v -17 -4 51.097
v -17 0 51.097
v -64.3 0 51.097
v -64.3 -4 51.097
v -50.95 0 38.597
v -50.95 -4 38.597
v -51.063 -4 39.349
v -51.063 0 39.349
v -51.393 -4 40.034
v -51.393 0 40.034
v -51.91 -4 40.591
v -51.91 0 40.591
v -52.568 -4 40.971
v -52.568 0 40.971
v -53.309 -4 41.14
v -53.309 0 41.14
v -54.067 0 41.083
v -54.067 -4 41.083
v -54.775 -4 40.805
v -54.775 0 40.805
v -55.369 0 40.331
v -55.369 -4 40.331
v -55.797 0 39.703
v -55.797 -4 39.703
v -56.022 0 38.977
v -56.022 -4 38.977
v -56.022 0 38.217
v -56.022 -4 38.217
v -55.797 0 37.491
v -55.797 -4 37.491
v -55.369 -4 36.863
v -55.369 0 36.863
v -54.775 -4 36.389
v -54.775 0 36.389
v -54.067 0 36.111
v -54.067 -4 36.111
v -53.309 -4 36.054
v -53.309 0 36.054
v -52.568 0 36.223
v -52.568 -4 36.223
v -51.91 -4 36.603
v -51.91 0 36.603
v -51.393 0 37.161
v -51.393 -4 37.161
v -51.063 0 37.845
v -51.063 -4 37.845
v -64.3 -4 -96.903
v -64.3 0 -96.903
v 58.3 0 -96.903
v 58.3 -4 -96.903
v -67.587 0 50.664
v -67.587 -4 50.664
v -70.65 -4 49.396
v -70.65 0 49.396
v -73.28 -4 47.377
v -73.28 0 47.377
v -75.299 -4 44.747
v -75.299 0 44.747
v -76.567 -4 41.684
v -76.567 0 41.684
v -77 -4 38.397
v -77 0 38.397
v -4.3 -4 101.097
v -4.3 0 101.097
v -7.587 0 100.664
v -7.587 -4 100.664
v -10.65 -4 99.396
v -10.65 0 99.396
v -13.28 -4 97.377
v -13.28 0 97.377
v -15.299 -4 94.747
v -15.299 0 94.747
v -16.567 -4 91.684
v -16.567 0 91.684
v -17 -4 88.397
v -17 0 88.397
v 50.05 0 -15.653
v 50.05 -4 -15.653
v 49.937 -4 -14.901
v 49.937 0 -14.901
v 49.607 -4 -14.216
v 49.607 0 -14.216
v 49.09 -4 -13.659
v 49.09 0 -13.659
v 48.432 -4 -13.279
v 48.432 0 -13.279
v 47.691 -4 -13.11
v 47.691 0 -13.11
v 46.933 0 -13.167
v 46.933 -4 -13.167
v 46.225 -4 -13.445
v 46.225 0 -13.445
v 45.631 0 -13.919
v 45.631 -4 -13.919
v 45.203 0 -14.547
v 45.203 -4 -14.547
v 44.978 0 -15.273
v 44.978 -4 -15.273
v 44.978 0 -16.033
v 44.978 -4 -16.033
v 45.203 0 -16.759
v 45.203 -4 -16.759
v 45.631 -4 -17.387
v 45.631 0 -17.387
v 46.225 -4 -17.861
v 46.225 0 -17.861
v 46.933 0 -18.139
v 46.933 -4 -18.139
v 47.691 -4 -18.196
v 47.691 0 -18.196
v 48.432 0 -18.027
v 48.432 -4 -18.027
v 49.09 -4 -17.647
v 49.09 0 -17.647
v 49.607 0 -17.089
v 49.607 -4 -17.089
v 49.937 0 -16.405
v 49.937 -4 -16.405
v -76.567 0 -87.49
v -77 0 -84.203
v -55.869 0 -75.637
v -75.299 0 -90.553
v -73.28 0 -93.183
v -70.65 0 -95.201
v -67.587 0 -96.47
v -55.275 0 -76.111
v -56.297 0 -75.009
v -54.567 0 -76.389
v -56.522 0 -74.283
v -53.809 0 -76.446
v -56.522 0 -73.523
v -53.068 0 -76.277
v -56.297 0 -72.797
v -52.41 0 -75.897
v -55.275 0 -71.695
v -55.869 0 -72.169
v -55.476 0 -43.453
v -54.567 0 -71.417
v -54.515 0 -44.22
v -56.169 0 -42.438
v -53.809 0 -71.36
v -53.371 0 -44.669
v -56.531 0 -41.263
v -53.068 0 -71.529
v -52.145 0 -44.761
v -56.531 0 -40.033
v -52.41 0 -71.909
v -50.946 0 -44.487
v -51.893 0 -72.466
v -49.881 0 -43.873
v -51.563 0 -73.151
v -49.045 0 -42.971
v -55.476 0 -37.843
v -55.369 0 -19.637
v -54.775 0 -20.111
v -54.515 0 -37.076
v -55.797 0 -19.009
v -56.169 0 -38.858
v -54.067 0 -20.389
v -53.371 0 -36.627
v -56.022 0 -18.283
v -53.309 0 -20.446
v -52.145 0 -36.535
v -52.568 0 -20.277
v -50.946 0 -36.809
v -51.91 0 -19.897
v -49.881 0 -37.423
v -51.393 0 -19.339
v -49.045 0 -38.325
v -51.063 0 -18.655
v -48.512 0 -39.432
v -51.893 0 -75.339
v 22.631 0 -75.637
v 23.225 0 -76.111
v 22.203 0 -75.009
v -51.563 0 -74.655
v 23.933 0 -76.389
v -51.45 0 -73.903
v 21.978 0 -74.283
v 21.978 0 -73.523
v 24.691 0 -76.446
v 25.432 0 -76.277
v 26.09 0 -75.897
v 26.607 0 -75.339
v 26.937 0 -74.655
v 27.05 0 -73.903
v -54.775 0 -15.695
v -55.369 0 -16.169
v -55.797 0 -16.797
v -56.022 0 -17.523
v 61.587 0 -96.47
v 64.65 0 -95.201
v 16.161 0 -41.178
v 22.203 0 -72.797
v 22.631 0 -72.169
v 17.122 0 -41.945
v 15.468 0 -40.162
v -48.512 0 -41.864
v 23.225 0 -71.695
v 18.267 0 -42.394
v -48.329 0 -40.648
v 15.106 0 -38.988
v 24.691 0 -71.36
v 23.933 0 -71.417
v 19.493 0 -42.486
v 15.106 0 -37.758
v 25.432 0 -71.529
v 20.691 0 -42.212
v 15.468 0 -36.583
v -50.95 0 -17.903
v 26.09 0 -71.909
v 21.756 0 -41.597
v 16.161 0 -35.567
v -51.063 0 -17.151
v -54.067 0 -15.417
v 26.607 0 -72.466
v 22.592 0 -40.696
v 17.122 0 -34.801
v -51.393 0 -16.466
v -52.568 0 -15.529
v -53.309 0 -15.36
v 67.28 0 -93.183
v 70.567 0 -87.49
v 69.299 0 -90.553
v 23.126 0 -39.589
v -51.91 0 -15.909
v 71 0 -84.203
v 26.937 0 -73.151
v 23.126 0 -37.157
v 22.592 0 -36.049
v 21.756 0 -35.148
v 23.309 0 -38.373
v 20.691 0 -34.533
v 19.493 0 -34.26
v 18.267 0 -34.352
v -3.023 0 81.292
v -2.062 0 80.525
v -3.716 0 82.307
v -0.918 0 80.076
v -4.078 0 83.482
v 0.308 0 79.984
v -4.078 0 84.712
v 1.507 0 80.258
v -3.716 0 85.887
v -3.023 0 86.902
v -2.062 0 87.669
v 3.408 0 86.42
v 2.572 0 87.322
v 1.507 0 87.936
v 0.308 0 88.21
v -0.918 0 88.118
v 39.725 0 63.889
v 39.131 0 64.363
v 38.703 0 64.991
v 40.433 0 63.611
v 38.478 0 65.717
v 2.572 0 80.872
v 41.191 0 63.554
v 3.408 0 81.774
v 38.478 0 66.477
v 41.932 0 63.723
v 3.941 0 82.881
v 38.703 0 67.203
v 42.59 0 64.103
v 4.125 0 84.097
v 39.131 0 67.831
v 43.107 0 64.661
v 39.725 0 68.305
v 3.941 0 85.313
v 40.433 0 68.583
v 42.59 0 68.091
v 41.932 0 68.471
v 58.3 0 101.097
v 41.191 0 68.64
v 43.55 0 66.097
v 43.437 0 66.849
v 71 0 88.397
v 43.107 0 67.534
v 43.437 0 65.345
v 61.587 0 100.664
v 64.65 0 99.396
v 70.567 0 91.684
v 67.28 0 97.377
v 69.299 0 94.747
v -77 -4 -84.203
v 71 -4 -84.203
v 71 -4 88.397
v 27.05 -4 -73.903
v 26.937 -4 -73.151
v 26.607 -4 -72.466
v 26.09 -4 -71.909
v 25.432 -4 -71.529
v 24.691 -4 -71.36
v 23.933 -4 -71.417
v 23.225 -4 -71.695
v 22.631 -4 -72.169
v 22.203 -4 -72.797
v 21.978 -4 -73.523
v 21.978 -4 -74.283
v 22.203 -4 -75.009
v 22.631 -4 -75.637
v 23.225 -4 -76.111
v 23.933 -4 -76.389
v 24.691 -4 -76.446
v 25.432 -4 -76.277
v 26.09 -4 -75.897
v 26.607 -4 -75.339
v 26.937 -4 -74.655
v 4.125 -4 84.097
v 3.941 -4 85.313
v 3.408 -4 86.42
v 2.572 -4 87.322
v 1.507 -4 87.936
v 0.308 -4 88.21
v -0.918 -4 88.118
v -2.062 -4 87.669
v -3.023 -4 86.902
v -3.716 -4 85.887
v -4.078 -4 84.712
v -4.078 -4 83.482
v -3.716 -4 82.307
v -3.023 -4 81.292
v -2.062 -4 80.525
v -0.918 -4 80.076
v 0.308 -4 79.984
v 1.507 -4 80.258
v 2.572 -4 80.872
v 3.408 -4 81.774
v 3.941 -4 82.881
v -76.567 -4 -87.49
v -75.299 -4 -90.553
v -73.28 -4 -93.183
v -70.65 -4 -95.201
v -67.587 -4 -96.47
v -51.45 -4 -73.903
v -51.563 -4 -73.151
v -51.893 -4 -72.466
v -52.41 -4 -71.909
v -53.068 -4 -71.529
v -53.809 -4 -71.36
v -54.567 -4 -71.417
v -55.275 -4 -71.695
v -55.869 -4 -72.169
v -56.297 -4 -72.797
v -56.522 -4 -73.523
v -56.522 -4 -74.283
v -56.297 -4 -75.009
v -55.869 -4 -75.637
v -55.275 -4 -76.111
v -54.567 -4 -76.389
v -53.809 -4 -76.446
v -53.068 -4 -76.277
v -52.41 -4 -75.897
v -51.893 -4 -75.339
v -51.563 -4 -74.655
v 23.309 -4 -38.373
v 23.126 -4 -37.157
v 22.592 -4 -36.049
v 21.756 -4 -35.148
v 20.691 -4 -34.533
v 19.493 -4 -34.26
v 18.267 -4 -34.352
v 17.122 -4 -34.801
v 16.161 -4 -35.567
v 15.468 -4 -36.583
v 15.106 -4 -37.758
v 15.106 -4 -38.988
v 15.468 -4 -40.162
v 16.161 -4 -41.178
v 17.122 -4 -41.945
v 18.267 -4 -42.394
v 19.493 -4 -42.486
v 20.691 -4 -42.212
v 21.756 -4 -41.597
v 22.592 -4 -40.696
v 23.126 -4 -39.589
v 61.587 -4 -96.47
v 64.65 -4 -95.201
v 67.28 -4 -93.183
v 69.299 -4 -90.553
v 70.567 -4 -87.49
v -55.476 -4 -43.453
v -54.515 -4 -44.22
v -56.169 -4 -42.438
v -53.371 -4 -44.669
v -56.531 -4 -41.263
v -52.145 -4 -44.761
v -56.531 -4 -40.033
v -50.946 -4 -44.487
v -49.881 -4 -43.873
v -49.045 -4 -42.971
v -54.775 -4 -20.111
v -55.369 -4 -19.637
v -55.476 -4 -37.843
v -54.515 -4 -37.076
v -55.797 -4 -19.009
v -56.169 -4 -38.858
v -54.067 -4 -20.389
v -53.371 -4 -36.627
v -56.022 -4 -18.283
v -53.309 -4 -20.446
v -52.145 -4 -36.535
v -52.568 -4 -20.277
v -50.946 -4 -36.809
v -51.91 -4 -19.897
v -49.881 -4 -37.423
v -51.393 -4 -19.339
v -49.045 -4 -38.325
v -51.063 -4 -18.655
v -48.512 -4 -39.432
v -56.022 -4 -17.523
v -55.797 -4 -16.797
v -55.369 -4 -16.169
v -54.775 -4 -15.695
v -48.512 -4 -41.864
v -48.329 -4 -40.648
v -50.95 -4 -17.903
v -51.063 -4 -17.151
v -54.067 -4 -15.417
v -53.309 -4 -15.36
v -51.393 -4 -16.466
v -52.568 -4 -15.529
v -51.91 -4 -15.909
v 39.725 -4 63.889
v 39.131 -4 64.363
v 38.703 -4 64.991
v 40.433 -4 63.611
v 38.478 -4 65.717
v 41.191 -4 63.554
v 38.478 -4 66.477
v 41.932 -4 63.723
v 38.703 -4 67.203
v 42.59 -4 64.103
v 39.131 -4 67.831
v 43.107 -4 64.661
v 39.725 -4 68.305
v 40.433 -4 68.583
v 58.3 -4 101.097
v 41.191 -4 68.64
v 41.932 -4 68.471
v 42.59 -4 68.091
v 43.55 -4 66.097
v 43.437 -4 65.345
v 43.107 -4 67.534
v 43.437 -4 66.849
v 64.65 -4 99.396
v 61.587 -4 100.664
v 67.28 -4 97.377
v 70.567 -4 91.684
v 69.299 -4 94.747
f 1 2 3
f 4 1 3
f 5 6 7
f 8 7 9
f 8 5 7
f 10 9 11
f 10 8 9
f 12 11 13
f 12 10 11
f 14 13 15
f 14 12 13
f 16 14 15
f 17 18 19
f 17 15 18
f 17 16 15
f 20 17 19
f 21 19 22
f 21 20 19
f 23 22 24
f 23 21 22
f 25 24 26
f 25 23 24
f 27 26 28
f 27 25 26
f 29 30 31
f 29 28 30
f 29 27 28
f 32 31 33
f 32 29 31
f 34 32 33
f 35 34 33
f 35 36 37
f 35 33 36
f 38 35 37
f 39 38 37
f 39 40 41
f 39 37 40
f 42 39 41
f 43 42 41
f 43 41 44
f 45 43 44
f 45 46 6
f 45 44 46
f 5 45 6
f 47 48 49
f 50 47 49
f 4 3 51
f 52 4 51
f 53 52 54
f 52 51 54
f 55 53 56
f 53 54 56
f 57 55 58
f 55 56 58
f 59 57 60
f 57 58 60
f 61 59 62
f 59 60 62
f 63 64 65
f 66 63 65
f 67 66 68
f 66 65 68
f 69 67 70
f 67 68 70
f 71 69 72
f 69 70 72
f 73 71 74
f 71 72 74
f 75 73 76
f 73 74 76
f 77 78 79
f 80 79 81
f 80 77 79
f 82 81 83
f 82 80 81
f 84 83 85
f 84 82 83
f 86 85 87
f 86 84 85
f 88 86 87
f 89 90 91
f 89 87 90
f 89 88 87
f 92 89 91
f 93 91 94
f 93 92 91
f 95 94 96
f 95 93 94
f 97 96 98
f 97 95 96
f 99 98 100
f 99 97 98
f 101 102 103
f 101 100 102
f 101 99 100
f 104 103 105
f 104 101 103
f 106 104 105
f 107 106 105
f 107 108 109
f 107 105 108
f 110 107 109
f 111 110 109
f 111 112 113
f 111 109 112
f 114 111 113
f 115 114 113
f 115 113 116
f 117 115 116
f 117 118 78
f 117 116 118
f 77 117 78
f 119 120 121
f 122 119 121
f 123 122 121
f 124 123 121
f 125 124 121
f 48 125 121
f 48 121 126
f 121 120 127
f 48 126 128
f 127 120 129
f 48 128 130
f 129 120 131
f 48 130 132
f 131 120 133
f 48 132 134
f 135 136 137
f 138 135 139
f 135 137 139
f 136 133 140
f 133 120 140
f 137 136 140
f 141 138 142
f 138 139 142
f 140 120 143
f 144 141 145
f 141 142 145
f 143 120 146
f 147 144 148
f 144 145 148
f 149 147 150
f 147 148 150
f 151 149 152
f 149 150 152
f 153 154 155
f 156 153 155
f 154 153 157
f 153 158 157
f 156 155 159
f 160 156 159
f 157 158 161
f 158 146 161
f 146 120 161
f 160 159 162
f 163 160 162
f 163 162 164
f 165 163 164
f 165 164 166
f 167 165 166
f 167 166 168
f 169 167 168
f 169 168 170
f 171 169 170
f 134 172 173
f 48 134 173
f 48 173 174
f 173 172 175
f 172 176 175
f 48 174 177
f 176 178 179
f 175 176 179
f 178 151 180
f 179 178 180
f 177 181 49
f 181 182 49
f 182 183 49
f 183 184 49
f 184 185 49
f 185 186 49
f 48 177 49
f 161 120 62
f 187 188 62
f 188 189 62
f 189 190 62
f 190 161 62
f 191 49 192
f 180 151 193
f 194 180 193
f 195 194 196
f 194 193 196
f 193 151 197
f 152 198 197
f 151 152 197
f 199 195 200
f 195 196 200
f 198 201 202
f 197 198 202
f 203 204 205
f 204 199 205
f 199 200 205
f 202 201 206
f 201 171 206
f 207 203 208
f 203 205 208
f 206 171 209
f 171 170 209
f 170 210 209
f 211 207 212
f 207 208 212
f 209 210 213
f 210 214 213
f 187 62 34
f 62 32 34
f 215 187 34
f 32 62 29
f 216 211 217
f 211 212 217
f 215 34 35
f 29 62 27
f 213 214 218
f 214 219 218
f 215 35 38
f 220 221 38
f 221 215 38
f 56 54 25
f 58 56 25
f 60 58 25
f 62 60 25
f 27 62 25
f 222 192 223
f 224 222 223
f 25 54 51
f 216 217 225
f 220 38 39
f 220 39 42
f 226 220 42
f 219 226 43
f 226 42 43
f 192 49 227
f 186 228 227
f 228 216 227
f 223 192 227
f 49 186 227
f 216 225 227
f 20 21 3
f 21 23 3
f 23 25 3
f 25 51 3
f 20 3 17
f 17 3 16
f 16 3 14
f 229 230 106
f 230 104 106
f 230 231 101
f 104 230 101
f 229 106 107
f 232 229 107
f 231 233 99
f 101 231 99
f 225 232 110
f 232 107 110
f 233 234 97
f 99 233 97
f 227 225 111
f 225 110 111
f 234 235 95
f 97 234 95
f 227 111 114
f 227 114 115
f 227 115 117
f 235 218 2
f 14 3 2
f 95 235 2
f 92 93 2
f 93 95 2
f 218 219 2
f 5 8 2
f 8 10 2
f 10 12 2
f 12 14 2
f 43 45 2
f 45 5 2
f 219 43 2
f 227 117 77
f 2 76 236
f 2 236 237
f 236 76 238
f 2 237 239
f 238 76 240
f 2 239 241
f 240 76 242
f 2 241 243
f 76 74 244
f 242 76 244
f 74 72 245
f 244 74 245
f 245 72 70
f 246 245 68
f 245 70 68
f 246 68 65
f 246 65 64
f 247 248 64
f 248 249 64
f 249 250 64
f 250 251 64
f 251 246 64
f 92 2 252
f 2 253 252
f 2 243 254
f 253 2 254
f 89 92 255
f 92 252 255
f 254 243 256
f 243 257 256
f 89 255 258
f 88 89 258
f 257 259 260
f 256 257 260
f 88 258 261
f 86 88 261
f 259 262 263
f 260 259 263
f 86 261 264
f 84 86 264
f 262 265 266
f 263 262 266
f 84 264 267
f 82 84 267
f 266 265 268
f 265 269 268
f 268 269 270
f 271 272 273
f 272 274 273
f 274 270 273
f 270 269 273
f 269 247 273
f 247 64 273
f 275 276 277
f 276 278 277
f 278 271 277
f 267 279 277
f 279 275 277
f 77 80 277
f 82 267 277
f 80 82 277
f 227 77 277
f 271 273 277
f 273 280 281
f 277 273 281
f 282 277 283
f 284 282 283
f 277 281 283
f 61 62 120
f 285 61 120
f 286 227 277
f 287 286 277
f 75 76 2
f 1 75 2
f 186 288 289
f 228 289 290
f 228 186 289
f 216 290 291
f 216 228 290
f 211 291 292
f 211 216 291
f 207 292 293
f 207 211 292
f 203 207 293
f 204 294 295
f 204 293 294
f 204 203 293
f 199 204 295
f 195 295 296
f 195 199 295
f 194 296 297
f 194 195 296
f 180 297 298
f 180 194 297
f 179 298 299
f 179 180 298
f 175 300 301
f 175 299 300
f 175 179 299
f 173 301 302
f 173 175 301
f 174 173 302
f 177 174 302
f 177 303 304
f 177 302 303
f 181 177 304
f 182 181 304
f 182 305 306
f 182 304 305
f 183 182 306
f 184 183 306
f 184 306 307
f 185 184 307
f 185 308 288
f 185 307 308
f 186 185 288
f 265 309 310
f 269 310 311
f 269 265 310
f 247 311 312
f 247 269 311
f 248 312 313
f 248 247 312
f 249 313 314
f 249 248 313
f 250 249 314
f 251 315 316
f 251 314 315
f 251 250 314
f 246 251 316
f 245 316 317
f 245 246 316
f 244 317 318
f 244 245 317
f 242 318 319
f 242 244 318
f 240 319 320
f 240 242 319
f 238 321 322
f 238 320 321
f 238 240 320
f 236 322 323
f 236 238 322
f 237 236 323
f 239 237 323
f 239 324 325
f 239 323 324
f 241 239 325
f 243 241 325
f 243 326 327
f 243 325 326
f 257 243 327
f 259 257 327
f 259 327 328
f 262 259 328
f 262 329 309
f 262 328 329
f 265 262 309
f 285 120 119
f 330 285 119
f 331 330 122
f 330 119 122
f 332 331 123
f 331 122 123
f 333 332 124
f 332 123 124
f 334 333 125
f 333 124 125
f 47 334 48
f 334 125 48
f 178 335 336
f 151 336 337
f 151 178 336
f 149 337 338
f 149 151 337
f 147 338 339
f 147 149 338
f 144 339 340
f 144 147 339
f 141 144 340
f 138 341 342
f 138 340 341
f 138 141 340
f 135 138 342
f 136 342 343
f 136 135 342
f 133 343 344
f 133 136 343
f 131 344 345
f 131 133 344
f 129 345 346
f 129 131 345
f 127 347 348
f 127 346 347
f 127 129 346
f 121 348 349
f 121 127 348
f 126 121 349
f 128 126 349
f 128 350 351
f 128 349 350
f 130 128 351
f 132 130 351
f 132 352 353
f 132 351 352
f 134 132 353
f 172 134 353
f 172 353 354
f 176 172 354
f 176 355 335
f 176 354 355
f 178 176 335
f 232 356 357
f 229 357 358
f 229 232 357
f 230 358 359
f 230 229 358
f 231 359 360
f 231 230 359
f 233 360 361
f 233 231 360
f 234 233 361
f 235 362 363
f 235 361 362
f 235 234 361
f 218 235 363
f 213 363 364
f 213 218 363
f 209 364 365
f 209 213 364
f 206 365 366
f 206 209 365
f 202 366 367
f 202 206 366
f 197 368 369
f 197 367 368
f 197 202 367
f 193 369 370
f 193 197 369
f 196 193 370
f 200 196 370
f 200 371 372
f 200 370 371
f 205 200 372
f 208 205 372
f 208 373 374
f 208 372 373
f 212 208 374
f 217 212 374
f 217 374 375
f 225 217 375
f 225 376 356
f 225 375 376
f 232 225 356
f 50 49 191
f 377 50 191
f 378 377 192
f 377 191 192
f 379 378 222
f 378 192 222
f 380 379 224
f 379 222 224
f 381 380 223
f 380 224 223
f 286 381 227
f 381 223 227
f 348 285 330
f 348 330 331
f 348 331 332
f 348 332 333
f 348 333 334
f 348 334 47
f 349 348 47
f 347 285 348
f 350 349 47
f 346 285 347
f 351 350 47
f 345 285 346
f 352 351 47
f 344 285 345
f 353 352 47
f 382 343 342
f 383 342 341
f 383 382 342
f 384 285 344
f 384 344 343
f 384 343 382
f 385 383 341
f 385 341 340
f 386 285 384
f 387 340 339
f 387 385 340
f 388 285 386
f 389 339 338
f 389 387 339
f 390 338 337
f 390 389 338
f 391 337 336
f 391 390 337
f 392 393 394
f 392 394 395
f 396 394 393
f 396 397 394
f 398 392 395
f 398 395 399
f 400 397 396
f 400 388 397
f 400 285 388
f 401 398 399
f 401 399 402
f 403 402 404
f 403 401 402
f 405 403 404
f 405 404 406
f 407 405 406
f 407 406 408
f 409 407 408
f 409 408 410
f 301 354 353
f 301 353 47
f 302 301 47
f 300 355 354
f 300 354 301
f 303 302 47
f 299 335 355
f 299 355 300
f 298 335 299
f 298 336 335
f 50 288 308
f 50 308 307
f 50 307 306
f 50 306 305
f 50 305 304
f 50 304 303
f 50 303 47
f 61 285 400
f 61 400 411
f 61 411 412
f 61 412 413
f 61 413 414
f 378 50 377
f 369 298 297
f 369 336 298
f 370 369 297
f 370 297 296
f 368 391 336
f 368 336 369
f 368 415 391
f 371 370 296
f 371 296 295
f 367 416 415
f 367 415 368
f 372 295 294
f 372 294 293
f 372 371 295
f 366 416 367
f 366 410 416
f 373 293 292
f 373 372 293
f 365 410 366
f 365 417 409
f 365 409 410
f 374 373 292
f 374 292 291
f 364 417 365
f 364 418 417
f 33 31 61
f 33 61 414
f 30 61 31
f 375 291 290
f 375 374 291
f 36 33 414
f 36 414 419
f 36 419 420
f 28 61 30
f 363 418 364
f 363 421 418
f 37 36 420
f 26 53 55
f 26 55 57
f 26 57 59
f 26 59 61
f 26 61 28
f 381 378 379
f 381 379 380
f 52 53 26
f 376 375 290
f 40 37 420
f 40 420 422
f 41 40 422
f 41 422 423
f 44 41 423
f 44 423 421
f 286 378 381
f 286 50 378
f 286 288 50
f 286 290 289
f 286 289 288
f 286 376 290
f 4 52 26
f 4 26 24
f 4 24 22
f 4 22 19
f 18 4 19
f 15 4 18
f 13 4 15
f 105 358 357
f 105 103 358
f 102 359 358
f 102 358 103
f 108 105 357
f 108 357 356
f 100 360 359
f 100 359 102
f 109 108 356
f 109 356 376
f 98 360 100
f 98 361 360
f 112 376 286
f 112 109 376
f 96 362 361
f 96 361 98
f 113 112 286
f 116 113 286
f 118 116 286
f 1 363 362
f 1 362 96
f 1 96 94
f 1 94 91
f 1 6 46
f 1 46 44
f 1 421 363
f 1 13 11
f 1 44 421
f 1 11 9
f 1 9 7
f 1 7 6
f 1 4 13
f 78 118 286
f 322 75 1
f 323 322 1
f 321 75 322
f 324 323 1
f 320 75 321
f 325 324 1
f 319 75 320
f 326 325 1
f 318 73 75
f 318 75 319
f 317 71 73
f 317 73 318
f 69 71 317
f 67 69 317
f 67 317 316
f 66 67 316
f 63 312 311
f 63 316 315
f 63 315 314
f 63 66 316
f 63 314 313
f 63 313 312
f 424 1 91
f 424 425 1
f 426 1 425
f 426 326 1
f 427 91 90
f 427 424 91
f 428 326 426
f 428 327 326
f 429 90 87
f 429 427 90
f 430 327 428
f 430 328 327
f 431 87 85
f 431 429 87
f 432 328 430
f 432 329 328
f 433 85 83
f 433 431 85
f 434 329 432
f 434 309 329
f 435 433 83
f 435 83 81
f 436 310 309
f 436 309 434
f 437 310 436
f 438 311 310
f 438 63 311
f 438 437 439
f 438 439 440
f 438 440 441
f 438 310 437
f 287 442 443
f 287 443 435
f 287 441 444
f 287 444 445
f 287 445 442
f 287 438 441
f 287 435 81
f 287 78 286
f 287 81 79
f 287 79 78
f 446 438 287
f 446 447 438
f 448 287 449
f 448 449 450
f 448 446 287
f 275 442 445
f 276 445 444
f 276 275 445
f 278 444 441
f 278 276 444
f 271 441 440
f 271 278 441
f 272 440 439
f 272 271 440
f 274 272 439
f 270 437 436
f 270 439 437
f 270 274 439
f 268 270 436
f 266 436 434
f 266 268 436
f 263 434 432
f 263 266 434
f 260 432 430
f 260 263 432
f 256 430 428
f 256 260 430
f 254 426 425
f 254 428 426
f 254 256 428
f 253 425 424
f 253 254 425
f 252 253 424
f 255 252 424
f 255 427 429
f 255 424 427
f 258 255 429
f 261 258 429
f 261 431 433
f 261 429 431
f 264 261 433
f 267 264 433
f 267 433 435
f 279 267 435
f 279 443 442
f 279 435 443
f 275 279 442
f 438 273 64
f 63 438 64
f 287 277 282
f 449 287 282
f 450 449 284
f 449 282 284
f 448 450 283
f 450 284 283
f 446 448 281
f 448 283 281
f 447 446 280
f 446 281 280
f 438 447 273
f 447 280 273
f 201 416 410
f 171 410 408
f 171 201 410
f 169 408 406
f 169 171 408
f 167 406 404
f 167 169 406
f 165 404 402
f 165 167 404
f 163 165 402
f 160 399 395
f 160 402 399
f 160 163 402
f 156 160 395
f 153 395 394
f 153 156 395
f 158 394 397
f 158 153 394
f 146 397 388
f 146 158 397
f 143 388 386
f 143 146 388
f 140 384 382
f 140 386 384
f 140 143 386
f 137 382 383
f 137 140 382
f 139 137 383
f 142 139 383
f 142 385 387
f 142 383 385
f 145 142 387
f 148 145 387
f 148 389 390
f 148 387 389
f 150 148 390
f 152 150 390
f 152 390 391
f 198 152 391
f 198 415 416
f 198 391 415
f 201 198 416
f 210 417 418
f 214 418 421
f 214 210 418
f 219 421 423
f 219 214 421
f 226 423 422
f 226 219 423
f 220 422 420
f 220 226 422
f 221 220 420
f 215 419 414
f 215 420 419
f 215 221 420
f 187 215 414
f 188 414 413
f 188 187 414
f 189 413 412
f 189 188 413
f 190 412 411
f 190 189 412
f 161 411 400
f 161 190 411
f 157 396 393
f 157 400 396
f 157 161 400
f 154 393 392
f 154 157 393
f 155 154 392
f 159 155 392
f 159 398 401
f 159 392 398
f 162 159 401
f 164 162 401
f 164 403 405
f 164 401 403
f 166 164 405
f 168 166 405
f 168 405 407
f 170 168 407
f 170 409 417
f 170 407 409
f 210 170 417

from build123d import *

# Parameters (mm, degrees)
F5_DEPTH = 4
F0_R     = 4.124509
F6_DEPTH = 32.004
F4_R     = 2.55
F7_DEPTH = 18.542
F2_R     = 2.55
F8_DEPTH = 16.764
F3_R     = 2.55
F9_DEPTH = 10.668


with BuildPart() as f5:
    # F1 (on Front) → F5 (new body)
    with BuildSketch(Plane.XZ):
        with BuildLine():
            ThreePointArc((-4.3, 101.097035), (-13.280256, 97.377291), (-17, 88.397035))
            Line((-17, 88.397035), (-17, 51.097035))
            Line((-17, 51.097035), (-64.3, 51.097035))
            ThreePointArc((-64.3, 51.097035), (-73.280256, 47.377291), (-77, 38.397035))
            Line((-77, 38.397035), (-77, -84.202965))
            ThreePointArc((-77, -84.202965), (-73.280256, -93.183221), (-64.3, -96.902965))
            Line((-64.3, -96.902965), (58.3, -96.902965))
            ThreePointArc((58.3, -96.902965), (67.280256, -93.183221), (71, -84.202965))
            Line((71, -84.202965), (71, 88.397035))
            ThreePointArc((71, 88.397035), (67.280256, 97.377291), (58.3, 101.097035))
            Line((58.3, 101.097035), (-4.3, 101.097035))
        make_face()
    extrude(amount=F5_DEPTH)

    # F0 (on Front) → F6 (cut)
    with BuildSketch(Plane.XZ):
        with Locations((-52.453019, -40.648032)):
            Circle(F0_R)
        with Locations((19.184319, -38.372811)):
            Circle(F0_R)
        with Locations((0, 84.097035)):
            Circle(F0_R)
    extrude(amount=F6_DEPTH, mode=Mode.SUBTRACT)

    # F4 (on Front) → F7 (cut)
    with BuildSketch(Plane.XZ):
        with Locations((-54, -73.902965)):
            Circle(F4_R)
        with Locations((24.5, -73.902965)):
            Circle(F4_R)
    extrude(amount=F7_DEPTH, mode=Mode.SUBTRACT)

    # F2 (on Front) → F8 (cut)
    with BuildSketch(Plane.XZ):
        with Locations((-53.5, 38.597035)):
            Circle(F2_R)
        with Locations((-53.5, -17.902965)):
            Circle(F2_R)
    extrude(amount=F8_DEPTH, mode=Mode.SUBTRACT)

    # F3 (on Front) → F9 (cut)
    with BuildSketch(Plane.XZ):
        with Locations((41, 66.097035)):
            Circle(F3_R)
        with Locations((47.5, -15.652965)):
            Circle(F3_R)
    extrude(amount=F9_DEPTH, mode=Mode.SUBTRACT)


solid = f5.part
